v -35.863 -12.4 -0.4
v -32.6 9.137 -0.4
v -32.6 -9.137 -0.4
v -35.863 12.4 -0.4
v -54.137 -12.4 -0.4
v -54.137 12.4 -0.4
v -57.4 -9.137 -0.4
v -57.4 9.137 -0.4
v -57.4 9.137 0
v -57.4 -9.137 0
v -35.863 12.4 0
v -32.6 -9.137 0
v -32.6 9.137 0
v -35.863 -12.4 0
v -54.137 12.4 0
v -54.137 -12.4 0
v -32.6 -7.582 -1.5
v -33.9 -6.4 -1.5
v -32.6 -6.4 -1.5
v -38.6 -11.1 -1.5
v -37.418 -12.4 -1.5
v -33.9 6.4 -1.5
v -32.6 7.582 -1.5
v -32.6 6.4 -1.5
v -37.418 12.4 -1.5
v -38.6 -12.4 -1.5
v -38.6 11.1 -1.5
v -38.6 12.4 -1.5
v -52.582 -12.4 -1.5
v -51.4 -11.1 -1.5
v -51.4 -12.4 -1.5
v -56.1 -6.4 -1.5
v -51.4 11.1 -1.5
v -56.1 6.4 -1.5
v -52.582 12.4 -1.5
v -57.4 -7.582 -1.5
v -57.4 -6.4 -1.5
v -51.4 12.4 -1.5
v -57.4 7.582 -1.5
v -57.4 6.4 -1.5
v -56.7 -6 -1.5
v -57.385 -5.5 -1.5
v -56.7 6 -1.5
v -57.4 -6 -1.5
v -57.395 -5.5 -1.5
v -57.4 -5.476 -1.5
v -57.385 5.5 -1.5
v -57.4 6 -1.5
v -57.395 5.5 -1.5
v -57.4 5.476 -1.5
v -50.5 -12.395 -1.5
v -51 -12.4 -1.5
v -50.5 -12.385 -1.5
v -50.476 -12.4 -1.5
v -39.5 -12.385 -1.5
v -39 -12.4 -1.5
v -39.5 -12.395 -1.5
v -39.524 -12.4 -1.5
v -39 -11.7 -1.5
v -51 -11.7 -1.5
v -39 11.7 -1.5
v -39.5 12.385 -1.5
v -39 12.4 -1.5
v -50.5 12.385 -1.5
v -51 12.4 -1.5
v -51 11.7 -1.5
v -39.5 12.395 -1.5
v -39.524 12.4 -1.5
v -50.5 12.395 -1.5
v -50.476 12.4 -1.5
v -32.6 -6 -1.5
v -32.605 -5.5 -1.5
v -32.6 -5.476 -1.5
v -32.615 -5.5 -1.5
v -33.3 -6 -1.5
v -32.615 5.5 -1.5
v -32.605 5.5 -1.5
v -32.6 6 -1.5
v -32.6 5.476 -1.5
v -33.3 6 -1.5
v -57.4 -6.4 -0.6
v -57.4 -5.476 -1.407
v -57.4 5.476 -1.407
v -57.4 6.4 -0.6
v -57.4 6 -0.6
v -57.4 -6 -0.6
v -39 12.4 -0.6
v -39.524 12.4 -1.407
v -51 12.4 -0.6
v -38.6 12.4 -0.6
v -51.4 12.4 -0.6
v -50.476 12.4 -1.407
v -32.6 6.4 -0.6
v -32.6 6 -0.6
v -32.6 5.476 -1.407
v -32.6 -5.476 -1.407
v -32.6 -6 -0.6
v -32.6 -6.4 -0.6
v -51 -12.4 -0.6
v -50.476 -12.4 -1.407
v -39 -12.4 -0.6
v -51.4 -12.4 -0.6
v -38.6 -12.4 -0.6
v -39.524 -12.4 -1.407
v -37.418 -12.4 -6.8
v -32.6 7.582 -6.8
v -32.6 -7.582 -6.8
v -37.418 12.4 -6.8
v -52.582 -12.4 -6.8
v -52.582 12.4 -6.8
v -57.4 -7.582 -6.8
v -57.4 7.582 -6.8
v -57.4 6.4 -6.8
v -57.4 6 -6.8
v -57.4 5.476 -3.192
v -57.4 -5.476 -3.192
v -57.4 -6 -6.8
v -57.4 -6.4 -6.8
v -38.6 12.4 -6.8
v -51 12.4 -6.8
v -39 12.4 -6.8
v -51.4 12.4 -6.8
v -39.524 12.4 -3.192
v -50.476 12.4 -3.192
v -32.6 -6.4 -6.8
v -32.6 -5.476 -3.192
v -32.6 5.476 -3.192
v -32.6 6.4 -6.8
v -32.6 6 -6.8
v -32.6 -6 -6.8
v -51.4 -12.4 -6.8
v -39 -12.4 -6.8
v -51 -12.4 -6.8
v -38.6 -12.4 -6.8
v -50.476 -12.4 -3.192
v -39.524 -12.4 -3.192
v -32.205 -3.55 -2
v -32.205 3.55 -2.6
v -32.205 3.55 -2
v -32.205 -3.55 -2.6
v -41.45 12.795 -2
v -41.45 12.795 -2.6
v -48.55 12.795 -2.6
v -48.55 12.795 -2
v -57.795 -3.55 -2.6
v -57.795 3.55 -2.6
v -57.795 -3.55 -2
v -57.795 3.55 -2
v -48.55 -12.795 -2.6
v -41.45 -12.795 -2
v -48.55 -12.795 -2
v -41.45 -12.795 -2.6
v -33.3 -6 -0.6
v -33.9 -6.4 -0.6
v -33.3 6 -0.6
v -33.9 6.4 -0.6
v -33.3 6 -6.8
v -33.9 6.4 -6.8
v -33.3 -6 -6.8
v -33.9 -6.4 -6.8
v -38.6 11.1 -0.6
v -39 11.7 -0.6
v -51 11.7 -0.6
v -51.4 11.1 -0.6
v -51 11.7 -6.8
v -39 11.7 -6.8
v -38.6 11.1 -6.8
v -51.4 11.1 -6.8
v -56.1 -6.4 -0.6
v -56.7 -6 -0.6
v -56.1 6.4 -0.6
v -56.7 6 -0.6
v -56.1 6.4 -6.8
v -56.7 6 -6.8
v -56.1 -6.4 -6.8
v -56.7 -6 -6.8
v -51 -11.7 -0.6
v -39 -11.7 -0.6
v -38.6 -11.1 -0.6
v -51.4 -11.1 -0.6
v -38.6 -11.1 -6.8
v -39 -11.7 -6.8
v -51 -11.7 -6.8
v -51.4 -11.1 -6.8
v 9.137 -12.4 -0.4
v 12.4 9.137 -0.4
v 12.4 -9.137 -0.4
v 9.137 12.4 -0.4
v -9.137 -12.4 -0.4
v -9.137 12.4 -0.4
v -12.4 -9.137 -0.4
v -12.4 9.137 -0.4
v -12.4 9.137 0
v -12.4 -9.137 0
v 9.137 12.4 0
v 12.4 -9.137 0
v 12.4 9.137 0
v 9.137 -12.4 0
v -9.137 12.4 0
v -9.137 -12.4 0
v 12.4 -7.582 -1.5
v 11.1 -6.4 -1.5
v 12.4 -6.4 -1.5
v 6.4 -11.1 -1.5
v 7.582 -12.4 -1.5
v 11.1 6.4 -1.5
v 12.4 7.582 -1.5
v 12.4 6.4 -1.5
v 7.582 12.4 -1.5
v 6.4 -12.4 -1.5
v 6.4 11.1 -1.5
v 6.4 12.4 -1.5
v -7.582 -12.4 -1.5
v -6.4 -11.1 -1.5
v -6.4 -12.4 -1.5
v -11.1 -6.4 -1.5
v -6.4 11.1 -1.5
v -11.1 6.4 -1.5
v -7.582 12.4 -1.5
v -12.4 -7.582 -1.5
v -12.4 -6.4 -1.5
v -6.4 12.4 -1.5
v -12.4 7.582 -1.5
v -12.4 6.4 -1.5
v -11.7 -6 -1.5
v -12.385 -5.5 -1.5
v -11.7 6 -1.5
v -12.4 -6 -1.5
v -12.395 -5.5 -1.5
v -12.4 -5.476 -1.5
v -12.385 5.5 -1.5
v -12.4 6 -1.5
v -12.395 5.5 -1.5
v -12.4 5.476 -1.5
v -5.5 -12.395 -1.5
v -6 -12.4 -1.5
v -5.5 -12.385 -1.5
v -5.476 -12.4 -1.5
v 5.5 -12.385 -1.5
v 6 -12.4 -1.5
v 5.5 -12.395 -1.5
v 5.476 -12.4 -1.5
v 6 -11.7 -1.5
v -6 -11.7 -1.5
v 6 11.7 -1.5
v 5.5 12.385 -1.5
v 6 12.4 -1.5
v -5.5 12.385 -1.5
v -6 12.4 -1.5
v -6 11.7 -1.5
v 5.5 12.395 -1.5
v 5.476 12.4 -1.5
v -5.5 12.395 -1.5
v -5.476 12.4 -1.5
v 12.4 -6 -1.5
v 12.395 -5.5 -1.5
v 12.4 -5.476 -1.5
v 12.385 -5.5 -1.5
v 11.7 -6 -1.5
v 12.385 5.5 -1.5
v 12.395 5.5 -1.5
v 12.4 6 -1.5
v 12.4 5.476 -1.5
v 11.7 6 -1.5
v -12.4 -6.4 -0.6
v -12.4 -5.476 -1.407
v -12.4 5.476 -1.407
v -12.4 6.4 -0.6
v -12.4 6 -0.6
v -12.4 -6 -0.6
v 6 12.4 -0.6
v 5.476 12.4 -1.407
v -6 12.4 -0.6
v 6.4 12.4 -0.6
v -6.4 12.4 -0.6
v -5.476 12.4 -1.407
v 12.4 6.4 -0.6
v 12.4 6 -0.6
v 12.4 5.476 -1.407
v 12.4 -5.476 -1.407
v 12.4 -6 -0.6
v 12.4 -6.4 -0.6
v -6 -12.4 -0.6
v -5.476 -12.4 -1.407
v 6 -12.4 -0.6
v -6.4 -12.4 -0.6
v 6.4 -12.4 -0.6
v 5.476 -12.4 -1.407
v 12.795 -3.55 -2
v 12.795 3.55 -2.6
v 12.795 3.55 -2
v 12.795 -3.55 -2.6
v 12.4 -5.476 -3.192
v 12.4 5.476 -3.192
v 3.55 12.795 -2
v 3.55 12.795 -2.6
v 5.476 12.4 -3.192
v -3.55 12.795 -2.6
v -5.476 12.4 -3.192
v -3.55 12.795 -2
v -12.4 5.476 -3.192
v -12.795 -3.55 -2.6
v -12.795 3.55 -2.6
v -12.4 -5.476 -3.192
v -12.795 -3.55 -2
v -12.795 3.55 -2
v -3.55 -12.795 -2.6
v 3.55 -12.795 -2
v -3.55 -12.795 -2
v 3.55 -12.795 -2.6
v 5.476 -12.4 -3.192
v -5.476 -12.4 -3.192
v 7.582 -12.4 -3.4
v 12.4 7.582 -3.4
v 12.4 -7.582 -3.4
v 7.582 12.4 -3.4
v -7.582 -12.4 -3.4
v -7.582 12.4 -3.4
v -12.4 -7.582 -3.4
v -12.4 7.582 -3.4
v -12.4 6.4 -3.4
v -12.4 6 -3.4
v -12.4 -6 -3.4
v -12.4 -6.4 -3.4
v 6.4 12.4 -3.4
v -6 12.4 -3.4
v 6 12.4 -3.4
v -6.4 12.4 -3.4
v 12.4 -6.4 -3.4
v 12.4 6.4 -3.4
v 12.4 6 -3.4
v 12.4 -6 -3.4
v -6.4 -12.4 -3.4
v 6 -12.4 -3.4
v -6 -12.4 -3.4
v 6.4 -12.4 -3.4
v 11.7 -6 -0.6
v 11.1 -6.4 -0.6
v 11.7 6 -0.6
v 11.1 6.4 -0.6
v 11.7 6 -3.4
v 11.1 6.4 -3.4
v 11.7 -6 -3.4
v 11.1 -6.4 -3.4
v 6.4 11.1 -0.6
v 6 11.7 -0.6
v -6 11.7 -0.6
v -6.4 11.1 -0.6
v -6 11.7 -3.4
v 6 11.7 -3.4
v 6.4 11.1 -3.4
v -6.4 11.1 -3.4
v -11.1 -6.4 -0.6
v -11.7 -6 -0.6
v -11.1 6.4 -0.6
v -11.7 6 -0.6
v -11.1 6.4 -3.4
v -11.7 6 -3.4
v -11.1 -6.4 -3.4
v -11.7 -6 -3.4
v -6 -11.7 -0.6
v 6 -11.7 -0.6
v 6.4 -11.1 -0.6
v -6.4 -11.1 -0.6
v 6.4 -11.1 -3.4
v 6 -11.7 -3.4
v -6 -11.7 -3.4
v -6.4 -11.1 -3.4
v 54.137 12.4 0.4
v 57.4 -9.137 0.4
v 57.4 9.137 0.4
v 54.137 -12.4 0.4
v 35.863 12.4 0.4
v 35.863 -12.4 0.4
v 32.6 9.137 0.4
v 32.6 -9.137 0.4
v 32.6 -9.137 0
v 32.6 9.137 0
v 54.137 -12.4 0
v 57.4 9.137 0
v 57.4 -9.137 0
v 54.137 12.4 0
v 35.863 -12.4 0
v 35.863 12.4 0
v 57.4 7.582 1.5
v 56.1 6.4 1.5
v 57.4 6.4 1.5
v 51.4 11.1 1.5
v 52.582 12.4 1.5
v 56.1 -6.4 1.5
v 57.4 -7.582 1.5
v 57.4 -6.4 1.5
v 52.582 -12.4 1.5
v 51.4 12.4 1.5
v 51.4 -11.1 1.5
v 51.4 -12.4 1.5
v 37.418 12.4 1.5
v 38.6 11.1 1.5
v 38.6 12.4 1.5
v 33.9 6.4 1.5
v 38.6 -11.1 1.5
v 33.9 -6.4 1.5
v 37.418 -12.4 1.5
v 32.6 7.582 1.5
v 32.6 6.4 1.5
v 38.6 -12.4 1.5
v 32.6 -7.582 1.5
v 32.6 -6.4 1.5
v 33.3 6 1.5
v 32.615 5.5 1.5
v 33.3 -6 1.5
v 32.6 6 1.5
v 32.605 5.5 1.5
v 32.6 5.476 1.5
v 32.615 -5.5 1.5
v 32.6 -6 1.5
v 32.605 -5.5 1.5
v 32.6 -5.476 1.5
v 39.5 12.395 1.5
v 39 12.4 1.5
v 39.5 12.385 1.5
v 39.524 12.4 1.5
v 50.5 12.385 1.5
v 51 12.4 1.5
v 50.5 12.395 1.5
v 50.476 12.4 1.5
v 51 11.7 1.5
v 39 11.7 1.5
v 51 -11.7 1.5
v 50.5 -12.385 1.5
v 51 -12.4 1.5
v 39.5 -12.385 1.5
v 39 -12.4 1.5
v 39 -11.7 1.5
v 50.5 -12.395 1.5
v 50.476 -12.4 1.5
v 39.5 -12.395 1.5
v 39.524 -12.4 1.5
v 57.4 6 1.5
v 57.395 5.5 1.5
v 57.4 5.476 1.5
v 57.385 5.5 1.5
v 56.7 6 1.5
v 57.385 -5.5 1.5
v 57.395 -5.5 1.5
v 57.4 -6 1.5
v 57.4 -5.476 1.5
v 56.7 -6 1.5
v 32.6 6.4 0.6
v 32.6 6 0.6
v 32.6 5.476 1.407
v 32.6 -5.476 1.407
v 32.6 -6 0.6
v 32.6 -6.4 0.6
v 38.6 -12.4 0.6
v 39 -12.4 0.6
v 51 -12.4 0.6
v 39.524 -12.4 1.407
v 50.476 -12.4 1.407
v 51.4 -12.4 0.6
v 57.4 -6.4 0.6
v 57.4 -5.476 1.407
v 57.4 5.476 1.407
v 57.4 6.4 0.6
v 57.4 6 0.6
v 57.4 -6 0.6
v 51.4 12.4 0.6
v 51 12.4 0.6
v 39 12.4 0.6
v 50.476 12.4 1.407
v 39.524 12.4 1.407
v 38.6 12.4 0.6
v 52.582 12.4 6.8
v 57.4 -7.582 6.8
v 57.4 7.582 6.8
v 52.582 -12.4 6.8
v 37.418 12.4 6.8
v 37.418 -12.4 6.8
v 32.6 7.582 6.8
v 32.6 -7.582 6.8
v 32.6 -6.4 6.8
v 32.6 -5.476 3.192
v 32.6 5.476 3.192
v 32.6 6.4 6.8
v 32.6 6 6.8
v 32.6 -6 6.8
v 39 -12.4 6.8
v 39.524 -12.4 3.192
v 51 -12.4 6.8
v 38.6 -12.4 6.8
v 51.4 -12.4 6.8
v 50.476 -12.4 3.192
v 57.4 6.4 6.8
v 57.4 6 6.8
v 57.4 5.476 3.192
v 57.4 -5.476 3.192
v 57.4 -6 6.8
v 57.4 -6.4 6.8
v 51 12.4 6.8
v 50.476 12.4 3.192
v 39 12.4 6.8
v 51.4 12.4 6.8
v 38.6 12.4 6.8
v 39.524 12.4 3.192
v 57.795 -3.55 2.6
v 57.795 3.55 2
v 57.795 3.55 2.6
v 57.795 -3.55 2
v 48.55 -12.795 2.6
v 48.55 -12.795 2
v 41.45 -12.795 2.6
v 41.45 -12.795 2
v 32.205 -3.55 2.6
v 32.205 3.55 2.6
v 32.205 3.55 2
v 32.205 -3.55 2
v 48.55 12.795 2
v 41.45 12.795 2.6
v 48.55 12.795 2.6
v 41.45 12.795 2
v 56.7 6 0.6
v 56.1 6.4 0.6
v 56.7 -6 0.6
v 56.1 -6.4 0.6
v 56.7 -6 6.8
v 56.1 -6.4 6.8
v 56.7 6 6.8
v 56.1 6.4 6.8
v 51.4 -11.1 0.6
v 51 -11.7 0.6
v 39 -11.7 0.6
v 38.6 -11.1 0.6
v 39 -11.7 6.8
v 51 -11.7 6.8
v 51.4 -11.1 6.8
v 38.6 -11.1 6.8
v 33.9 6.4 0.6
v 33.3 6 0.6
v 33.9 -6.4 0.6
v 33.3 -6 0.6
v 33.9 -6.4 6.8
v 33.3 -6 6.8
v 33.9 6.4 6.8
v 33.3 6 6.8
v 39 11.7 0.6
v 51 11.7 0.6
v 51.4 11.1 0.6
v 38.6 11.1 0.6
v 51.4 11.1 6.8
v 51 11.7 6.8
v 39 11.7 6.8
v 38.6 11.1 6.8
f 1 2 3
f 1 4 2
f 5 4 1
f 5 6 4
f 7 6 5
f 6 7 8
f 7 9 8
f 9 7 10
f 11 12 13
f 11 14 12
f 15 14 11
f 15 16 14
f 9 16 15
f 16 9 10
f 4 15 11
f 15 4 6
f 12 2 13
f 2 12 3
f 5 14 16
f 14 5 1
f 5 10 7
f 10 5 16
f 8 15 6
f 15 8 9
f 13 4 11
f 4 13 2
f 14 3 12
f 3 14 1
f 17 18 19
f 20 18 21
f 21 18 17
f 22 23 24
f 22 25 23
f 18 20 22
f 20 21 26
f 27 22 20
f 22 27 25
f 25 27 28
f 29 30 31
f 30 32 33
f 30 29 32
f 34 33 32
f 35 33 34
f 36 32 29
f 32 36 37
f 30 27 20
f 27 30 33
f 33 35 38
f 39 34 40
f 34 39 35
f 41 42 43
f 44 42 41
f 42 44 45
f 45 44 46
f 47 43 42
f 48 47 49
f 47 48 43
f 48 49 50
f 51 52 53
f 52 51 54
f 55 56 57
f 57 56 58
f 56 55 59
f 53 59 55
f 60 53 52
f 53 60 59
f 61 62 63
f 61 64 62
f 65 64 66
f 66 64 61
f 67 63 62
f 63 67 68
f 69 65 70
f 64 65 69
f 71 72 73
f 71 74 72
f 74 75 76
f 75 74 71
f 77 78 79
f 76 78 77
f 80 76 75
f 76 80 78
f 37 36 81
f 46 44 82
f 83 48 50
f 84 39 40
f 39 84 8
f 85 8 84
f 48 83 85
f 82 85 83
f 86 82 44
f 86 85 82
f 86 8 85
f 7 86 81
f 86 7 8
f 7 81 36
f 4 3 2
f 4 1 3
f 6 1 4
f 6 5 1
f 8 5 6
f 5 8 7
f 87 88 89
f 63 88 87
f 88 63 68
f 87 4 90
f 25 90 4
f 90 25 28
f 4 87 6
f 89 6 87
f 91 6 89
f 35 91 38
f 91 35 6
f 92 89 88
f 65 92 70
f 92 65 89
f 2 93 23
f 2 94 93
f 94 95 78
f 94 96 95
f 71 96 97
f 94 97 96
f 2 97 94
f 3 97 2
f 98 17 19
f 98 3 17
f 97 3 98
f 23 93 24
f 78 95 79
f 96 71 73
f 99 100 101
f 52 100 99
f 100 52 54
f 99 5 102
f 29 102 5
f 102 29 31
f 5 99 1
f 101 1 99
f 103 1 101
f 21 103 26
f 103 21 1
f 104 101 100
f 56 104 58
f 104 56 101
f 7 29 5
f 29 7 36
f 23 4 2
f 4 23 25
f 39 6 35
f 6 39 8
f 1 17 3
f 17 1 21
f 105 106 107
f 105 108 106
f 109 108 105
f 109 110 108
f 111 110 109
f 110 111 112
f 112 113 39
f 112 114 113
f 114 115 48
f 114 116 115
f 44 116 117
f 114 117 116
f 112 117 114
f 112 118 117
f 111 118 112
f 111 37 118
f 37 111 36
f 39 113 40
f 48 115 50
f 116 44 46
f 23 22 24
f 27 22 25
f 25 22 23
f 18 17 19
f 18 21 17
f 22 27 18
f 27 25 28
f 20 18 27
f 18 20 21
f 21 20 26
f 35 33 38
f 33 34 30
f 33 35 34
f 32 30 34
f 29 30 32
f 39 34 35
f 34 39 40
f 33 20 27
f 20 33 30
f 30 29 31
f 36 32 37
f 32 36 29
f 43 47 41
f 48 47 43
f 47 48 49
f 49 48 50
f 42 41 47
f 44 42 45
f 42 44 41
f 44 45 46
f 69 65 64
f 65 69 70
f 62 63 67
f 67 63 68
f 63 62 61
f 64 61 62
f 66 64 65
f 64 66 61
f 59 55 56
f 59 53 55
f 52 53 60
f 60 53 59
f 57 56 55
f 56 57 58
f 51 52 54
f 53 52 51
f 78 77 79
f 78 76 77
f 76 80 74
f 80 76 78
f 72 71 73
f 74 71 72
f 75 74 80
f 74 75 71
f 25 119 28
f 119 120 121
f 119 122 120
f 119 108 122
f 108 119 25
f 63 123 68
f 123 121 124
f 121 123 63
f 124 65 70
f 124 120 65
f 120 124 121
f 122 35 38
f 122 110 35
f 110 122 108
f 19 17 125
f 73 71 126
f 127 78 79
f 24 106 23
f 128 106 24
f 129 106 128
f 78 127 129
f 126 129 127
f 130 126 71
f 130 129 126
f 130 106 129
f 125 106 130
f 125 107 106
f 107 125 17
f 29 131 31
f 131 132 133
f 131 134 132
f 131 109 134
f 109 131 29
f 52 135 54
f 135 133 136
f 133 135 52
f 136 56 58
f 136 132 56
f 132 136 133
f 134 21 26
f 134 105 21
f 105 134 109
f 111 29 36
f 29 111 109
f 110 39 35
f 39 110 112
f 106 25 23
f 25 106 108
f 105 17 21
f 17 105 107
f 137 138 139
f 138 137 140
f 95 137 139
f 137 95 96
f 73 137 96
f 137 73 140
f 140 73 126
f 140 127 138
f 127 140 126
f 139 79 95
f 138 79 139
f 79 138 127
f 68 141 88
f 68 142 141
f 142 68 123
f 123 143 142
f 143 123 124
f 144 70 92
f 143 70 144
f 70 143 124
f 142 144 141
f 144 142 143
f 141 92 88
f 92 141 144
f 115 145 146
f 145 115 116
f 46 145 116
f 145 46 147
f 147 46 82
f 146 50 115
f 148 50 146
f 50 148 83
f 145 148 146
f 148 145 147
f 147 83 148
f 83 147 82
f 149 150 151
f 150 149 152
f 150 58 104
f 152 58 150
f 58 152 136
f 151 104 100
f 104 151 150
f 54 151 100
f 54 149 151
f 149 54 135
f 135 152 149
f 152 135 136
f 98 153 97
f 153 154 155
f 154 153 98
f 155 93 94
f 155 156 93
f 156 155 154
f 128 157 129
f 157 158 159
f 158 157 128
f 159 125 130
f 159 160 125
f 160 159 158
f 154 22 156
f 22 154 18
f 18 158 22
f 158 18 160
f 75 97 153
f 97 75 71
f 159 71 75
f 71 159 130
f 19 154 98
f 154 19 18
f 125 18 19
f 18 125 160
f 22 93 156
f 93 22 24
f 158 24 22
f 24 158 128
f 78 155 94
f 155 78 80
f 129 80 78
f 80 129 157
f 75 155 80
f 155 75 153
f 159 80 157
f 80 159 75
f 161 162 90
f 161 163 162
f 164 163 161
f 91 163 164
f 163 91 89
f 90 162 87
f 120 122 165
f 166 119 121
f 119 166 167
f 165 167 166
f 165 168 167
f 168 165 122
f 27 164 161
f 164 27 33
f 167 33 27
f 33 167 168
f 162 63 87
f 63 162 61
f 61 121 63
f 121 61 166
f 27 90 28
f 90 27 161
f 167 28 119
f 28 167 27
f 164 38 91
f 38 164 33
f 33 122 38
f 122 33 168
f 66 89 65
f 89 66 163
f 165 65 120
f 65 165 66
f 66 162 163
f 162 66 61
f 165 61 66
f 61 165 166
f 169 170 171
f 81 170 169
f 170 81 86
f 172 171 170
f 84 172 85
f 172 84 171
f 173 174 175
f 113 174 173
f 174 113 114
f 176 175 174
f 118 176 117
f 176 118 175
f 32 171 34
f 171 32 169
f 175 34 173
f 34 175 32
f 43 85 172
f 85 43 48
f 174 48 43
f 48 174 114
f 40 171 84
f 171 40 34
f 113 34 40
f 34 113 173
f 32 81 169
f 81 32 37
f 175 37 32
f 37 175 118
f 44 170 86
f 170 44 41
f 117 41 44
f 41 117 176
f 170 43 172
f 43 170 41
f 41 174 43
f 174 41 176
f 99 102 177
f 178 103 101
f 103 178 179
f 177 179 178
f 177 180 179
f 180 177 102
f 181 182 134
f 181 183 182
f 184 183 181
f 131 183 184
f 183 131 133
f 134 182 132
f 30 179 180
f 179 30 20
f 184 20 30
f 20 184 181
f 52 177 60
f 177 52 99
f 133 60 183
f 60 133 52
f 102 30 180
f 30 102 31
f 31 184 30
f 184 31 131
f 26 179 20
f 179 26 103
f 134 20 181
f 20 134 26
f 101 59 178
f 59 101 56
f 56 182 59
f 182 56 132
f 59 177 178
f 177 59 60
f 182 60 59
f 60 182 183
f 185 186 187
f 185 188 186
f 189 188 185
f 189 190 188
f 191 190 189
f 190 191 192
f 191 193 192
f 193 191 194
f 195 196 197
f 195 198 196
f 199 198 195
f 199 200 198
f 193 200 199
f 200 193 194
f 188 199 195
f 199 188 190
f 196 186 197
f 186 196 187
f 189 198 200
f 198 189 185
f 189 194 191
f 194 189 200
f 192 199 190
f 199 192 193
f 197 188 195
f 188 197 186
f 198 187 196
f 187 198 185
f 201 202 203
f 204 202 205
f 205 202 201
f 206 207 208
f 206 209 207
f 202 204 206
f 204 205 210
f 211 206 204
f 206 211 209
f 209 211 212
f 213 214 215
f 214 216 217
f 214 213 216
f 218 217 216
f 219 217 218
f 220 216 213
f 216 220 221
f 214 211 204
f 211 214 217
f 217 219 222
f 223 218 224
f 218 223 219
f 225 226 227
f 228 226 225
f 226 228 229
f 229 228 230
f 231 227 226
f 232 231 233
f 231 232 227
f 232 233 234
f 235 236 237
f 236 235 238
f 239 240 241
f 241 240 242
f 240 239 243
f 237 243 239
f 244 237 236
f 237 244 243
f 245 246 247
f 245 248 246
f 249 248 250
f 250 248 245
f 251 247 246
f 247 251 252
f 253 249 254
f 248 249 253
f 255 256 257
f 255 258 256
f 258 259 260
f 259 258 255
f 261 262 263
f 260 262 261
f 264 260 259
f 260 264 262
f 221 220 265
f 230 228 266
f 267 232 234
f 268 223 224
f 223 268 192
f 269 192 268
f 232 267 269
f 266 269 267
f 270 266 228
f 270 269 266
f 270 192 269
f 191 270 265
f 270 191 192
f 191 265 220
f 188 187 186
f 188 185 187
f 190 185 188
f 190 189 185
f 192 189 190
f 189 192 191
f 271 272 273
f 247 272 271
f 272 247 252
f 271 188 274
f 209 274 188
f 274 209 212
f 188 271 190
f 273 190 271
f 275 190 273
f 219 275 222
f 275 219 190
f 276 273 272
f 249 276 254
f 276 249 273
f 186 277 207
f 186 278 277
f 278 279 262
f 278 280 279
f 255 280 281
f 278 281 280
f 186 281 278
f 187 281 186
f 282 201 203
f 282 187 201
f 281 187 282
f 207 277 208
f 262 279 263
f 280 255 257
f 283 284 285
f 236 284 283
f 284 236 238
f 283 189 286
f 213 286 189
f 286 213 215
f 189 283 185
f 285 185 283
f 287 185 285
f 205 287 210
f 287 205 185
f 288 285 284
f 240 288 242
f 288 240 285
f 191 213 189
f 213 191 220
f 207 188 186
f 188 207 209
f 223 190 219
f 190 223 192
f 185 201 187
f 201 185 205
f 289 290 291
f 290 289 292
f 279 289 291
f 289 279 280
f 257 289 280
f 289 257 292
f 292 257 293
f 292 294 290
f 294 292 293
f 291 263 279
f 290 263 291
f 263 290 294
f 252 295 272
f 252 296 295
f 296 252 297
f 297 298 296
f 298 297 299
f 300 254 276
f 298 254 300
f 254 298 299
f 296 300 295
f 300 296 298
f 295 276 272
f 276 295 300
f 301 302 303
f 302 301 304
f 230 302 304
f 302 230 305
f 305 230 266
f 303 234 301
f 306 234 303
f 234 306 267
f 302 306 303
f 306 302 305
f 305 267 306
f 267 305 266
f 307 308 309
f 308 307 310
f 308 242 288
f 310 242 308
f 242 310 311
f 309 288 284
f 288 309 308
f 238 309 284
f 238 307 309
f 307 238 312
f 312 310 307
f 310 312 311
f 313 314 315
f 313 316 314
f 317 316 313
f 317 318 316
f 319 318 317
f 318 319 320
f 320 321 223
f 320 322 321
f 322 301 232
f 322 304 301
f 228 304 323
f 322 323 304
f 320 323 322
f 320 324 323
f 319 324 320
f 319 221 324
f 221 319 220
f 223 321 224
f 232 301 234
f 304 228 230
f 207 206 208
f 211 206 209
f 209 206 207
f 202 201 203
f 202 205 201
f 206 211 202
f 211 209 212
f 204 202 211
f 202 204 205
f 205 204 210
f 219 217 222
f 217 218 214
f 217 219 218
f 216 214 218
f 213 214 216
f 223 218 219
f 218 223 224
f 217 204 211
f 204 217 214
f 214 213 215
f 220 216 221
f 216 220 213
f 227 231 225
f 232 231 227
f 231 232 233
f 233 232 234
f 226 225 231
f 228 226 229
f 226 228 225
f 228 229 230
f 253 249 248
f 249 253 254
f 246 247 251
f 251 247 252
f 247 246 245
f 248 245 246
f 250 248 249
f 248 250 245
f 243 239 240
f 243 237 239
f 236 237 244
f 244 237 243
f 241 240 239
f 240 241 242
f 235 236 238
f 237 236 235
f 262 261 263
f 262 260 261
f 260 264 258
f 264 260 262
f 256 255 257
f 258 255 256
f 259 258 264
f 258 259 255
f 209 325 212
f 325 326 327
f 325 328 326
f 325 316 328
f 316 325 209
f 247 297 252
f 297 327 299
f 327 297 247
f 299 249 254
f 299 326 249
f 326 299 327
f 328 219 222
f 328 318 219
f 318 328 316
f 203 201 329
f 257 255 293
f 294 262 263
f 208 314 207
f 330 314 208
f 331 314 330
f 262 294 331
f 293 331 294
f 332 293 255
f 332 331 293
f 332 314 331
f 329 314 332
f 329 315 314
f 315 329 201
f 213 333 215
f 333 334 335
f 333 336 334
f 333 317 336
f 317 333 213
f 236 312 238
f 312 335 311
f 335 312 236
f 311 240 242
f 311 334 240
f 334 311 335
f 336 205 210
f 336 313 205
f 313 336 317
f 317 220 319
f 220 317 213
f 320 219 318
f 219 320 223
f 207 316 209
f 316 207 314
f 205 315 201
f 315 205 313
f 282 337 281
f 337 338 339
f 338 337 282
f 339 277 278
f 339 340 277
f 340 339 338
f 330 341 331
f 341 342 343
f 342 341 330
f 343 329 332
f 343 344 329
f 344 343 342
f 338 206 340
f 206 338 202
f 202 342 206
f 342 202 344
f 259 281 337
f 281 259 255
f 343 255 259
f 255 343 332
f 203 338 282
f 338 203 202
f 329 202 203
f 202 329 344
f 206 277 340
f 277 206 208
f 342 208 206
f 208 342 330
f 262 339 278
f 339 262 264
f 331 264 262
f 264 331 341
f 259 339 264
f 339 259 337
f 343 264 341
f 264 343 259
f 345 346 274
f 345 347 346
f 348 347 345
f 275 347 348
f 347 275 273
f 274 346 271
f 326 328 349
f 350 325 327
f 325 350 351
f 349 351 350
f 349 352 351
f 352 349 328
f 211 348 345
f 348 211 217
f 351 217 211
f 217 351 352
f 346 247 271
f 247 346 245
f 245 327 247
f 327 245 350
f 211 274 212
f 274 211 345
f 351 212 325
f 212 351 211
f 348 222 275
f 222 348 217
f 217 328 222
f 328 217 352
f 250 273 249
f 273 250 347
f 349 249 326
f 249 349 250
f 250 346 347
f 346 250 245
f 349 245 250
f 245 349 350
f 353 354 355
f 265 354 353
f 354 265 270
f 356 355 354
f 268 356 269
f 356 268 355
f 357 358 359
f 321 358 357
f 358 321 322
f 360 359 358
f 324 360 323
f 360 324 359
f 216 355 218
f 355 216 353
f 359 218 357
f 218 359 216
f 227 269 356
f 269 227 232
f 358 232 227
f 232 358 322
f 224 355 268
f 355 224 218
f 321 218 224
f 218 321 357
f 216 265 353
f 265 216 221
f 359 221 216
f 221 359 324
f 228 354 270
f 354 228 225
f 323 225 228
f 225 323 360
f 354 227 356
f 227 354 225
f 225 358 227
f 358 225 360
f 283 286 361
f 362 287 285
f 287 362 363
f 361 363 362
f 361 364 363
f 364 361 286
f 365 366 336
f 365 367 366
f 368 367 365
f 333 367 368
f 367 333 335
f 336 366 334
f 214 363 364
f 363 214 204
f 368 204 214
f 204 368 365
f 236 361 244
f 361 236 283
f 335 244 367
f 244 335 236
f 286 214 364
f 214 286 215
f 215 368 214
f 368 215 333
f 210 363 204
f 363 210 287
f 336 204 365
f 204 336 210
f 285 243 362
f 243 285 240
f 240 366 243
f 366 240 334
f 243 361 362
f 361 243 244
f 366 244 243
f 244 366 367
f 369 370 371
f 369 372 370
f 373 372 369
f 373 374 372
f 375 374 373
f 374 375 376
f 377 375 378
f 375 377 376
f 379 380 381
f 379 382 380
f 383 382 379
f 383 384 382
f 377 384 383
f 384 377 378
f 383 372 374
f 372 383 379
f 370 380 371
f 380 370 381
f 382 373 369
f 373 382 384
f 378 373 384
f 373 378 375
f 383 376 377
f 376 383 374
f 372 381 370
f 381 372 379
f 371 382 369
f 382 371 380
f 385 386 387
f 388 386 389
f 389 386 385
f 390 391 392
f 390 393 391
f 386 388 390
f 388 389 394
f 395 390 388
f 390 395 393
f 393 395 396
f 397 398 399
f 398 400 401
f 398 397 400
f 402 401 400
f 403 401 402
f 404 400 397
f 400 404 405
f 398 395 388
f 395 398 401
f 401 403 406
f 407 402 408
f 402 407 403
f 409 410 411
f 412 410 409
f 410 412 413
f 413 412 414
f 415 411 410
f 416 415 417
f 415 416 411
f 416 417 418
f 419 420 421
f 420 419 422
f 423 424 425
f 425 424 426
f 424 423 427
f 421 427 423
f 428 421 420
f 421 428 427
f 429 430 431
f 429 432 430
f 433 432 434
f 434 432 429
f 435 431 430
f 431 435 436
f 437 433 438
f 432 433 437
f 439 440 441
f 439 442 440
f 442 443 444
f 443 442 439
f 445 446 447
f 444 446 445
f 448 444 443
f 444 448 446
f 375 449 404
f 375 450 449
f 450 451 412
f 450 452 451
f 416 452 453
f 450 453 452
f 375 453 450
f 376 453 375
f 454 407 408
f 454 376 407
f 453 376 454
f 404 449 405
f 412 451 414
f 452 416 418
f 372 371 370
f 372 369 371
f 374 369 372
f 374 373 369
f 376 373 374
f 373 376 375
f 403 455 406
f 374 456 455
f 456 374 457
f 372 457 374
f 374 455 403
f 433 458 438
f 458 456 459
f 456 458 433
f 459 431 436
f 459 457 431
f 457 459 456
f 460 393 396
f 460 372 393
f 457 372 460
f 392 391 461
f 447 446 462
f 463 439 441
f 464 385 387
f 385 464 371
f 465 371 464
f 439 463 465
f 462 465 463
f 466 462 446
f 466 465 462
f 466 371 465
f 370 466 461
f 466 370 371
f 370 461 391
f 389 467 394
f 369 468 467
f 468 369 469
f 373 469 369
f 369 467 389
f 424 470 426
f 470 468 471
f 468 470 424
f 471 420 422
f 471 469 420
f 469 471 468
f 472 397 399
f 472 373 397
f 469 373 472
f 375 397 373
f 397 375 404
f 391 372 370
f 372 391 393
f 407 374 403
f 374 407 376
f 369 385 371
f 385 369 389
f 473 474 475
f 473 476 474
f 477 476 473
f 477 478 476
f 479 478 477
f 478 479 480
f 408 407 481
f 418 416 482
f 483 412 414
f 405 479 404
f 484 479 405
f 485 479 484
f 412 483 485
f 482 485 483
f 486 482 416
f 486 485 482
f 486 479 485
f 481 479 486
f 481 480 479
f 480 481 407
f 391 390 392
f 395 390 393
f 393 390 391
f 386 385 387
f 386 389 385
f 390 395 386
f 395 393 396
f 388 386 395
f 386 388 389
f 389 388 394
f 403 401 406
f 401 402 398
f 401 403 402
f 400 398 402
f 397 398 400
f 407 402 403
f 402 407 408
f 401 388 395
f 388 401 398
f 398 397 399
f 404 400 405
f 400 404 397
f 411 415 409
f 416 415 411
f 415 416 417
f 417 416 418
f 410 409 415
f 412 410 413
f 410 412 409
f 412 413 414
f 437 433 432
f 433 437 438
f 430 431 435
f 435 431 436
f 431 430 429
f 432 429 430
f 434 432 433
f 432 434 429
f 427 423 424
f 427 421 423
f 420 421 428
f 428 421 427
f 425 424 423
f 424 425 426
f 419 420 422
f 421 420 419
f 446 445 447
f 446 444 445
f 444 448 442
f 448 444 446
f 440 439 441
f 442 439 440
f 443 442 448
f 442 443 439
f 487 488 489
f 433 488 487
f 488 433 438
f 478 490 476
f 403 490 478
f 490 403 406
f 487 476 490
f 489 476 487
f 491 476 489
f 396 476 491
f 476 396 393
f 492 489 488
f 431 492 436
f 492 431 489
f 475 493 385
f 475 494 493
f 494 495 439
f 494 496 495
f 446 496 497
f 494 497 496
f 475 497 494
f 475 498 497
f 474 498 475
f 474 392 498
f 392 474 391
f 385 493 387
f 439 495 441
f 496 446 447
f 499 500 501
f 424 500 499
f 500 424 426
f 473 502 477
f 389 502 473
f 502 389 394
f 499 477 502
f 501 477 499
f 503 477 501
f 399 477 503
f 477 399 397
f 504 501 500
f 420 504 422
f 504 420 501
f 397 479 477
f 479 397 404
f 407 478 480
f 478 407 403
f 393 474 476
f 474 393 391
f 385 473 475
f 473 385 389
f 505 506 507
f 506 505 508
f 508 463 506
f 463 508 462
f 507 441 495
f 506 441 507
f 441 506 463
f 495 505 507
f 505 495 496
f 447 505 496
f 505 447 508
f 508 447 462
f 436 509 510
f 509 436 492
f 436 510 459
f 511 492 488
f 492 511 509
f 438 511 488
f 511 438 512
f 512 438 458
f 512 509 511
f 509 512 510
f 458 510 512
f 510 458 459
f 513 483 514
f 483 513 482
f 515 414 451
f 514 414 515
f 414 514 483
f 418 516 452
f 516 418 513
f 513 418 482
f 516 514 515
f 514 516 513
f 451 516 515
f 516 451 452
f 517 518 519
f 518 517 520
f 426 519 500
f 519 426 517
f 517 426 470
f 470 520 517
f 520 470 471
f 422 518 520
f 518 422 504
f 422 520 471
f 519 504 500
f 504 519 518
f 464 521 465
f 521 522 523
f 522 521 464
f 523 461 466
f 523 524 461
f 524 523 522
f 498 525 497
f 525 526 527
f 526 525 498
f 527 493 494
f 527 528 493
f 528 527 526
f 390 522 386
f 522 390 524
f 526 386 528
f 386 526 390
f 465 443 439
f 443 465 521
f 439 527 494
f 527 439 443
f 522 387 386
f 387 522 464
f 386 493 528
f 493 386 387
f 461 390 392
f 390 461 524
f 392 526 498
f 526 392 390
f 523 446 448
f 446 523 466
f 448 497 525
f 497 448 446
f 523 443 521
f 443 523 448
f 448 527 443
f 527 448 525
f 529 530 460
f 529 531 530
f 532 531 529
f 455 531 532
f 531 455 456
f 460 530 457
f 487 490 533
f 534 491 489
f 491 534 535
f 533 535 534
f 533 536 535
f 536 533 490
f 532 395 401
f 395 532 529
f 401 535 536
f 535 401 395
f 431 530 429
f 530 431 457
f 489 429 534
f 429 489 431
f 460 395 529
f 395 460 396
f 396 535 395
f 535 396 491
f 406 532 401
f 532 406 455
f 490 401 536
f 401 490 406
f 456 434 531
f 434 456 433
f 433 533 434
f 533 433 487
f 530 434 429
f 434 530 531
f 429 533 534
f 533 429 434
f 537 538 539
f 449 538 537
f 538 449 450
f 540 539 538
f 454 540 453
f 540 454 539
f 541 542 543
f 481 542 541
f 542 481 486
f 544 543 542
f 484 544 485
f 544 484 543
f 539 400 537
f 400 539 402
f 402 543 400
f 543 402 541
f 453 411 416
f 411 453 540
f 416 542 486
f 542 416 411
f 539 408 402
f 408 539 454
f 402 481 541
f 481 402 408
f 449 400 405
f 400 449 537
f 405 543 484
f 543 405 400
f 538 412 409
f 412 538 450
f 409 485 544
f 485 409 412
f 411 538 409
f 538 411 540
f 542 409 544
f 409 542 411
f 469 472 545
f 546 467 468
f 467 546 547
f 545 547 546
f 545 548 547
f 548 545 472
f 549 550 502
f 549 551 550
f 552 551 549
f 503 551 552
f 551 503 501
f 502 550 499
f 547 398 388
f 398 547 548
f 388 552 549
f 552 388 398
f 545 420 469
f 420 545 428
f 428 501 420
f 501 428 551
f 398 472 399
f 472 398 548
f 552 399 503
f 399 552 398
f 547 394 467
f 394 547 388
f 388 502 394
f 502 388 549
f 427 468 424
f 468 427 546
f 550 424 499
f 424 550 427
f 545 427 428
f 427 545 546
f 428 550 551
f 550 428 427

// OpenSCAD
// opengrid_snap_example.scad -- the snap on its own, and fitted to a tile
include <../opengrid.scad>

// left: full snap, viewed from the front
translate([-45, 0, 0]) opengrid_snap(lite = false);

// centre: lite snap, 3.4 mm deep
translate([0, 0, 0]) opengrid_snap(lite = true);

// right: full snap, flipped so the flexing tabs and reliefs face the viewer
translate([45, 0, 0]) rotate([180, 0, 0]) opengrid_snap(lite = false);
